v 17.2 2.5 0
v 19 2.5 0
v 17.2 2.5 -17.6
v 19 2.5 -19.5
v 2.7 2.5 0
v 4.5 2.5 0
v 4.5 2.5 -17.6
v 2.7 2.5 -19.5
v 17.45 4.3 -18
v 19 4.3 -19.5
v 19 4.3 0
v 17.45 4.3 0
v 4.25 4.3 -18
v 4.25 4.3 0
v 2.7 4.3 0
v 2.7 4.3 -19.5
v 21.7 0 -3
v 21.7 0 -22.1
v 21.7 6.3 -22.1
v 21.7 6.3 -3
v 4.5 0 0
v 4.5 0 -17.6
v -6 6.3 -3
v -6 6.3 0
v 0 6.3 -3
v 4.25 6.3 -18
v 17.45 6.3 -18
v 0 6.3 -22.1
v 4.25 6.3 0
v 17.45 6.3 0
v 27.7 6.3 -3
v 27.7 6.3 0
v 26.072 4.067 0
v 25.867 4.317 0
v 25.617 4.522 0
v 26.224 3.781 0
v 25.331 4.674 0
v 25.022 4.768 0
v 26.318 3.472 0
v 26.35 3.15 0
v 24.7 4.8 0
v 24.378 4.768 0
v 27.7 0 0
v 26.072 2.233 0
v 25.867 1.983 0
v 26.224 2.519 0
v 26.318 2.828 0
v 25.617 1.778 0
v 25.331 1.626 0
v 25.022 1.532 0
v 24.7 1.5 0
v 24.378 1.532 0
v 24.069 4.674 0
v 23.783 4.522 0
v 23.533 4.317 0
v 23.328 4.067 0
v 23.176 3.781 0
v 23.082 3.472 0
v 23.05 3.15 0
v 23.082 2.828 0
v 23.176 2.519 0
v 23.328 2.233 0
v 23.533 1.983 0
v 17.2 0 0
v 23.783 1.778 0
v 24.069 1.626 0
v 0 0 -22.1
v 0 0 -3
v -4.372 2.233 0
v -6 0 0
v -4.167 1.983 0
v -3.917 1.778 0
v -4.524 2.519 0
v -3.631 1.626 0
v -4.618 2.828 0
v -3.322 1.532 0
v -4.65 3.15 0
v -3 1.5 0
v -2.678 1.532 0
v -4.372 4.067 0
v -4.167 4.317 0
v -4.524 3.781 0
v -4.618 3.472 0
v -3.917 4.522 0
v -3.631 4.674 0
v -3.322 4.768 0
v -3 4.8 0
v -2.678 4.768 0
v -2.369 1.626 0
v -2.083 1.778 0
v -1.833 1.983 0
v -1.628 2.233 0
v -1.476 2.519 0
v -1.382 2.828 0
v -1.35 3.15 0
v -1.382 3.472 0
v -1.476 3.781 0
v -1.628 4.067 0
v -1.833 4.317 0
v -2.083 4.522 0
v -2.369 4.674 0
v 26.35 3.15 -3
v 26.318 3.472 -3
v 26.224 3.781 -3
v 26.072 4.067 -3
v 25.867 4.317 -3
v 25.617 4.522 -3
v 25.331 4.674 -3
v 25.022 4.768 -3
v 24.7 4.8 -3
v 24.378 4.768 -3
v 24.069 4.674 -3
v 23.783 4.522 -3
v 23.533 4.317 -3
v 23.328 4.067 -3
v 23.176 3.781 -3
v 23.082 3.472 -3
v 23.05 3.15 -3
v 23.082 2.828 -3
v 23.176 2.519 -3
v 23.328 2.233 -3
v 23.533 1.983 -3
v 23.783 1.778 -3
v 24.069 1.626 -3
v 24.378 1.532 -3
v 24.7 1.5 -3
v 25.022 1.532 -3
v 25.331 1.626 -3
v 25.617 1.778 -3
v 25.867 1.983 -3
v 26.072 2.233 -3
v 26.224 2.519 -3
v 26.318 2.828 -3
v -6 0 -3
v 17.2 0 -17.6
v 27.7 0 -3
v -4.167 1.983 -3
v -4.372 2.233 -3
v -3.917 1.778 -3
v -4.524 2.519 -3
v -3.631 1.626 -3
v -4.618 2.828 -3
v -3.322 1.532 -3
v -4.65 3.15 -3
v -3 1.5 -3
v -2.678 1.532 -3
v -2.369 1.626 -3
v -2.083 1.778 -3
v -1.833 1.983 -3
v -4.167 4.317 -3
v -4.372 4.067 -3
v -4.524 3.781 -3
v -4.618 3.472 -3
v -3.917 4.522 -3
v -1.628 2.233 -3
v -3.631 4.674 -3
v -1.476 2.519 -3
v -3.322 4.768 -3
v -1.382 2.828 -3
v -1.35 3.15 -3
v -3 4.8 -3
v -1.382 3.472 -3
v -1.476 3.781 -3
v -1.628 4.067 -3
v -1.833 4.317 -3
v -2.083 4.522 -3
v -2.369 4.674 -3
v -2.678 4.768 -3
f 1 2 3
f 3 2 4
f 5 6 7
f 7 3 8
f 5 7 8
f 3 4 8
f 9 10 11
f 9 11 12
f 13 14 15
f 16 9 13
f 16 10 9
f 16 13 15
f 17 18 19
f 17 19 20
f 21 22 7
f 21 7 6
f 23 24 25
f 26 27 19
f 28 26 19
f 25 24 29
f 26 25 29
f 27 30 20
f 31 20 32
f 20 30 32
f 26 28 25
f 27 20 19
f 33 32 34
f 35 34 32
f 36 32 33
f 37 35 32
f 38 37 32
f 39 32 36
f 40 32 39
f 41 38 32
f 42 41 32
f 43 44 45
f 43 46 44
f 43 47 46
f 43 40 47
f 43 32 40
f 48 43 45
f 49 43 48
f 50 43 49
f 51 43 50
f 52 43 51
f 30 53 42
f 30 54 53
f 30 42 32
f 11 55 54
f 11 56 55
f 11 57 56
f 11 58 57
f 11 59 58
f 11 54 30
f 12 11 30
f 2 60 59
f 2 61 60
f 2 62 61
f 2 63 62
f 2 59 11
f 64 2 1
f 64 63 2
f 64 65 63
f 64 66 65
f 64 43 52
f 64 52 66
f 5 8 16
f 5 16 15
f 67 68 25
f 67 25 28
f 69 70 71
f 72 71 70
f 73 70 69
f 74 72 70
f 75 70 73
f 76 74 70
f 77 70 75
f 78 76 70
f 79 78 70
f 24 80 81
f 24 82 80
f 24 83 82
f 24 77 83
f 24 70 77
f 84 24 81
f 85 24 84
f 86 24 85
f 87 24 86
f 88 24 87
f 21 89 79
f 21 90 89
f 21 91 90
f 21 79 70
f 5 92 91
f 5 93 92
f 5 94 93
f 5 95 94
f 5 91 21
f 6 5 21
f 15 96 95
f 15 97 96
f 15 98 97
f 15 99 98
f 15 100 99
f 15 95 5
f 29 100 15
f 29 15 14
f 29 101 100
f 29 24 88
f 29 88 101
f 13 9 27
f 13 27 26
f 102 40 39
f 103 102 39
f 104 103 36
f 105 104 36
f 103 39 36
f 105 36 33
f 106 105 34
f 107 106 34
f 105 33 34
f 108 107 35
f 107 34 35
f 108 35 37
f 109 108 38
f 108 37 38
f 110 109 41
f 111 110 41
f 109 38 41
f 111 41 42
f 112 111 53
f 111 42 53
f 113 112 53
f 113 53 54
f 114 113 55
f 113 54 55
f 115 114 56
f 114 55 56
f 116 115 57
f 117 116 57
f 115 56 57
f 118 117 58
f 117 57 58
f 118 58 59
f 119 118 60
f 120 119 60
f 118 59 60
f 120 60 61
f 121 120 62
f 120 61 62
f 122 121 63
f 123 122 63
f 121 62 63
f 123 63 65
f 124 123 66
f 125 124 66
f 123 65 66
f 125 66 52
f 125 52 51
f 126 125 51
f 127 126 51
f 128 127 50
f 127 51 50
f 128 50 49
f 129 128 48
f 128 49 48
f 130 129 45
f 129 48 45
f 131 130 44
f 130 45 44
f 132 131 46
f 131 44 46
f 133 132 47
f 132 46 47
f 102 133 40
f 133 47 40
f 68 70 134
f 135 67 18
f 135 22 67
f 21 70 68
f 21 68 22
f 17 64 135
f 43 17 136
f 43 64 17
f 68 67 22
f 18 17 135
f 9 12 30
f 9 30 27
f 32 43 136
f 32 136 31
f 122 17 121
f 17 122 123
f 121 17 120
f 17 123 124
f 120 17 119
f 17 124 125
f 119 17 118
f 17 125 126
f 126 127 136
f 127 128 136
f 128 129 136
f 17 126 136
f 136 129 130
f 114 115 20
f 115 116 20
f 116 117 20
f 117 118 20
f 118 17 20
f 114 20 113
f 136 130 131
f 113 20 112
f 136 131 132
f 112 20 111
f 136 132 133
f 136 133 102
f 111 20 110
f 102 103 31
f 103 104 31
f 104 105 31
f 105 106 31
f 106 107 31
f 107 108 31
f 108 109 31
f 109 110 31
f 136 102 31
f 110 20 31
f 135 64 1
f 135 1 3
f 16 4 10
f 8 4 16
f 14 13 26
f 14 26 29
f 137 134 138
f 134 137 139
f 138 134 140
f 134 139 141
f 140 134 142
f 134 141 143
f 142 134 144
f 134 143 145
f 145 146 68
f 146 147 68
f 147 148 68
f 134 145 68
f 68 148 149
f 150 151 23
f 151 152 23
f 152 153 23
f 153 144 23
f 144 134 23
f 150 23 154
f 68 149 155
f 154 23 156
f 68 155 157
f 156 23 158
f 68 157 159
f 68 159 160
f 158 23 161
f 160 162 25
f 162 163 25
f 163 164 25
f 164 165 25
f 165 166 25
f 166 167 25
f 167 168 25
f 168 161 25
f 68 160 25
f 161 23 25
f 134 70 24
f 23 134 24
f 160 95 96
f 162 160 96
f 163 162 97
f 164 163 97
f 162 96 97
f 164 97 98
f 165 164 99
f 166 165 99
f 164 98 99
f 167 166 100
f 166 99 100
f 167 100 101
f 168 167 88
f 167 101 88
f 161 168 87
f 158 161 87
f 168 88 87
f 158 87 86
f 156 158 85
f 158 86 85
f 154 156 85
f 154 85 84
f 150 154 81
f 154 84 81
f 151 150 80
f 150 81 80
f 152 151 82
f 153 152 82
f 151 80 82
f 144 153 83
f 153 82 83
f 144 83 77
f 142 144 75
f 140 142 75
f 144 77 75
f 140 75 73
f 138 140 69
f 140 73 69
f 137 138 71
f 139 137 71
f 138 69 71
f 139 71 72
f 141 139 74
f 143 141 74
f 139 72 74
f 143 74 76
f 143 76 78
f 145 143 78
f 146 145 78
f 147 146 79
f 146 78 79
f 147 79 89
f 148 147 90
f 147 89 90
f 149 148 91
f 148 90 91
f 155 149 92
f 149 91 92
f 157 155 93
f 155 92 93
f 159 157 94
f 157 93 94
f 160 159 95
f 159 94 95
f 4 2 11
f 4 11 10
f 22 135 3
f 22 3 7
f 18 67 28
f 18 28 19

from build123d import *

# Parameters (mm, degrees)
BOSS_EXTRUDE2_DEPTH = 2.5
BOSS_EXTRUDE3_DEPTH = 1.8
BOSS_EXTRUDE4_DEPTH = 2
SKETCH6_W           = 6
SKETCH6_H           = 6.3
SKETCH6_R           = 1.65
BOSS_EXTRUDE6_DEPTH = 3


with BuildPart() as part:
    # Sketch1 → Boss-Extrude2 (new body)
    with BuildSketch(Plane(origin=(0, 0, 0), x_dir=(1, 0, 0), z_dir=(0, 1, 0))):
        Polygon((0, 0), (0, 22.1), (21.7, 22.1), (21.7, 0), (17.2, 0), (17.2, 17.6), (4.5, 17.6), (4.5, 0), align=None)
    extrude(amount=BOSS_EXTRUDE2_DEPTH)

    # Sketch3 → Boss-Extrude3 (add)
    with BuildSketch(Plane(origin=(0, 2.5, 0), x_dir=(1, 0, 0), z_dir=(0, 1, 0))):
        Polygon((0, 0), (0, 22.1), (21.7, 22.1), (21.7, 0), (19, 0), (19, 19.5), (2.7, 19.5), (2.7, 0), align=None)
    extrude(amount=BOSS_EXTRUDE3_DEPTH)

    # Sketch4 → Boss-Extrude4 (add)
    with BuildSketch(Plane(origin=(0, 4.3, 0), x_dir=(1, 0, 0), z_dir=(0, 1, 0))):
        Polygon((0, 0), (0, 22.1), (21.7, 22.1), (21.7, 0), (17.45, 0), (17.45, 18), (4.25, 18), (4.25, 0), align=None)
    extrude(amount=BOSS_EXTRUDE4_DEPTH)

    # Sketch6 → Boss-Extrude6 (add)
    with BuildSketch(Plane.XY):
        with Locations((-3, 3.15)):
            Rectangle(SKETCH6_W, SKETCH6_H)
        with Locations((-3, 3.15)):
            Circle(SKETCH6_R, mode=Mode.SUBTRACT)
        with Locations((24.7, 3.15)):
            Rectangle(SKETCH6_W, SKETCH6_H)
        with Locations((24.7, 3.15)):
            Circle(SKETCH6_R, mode=Mode.SUBTRACT)
    extrude(amount=-BOSS_EXTRUDE6_DEPTH)


solid = part.part
